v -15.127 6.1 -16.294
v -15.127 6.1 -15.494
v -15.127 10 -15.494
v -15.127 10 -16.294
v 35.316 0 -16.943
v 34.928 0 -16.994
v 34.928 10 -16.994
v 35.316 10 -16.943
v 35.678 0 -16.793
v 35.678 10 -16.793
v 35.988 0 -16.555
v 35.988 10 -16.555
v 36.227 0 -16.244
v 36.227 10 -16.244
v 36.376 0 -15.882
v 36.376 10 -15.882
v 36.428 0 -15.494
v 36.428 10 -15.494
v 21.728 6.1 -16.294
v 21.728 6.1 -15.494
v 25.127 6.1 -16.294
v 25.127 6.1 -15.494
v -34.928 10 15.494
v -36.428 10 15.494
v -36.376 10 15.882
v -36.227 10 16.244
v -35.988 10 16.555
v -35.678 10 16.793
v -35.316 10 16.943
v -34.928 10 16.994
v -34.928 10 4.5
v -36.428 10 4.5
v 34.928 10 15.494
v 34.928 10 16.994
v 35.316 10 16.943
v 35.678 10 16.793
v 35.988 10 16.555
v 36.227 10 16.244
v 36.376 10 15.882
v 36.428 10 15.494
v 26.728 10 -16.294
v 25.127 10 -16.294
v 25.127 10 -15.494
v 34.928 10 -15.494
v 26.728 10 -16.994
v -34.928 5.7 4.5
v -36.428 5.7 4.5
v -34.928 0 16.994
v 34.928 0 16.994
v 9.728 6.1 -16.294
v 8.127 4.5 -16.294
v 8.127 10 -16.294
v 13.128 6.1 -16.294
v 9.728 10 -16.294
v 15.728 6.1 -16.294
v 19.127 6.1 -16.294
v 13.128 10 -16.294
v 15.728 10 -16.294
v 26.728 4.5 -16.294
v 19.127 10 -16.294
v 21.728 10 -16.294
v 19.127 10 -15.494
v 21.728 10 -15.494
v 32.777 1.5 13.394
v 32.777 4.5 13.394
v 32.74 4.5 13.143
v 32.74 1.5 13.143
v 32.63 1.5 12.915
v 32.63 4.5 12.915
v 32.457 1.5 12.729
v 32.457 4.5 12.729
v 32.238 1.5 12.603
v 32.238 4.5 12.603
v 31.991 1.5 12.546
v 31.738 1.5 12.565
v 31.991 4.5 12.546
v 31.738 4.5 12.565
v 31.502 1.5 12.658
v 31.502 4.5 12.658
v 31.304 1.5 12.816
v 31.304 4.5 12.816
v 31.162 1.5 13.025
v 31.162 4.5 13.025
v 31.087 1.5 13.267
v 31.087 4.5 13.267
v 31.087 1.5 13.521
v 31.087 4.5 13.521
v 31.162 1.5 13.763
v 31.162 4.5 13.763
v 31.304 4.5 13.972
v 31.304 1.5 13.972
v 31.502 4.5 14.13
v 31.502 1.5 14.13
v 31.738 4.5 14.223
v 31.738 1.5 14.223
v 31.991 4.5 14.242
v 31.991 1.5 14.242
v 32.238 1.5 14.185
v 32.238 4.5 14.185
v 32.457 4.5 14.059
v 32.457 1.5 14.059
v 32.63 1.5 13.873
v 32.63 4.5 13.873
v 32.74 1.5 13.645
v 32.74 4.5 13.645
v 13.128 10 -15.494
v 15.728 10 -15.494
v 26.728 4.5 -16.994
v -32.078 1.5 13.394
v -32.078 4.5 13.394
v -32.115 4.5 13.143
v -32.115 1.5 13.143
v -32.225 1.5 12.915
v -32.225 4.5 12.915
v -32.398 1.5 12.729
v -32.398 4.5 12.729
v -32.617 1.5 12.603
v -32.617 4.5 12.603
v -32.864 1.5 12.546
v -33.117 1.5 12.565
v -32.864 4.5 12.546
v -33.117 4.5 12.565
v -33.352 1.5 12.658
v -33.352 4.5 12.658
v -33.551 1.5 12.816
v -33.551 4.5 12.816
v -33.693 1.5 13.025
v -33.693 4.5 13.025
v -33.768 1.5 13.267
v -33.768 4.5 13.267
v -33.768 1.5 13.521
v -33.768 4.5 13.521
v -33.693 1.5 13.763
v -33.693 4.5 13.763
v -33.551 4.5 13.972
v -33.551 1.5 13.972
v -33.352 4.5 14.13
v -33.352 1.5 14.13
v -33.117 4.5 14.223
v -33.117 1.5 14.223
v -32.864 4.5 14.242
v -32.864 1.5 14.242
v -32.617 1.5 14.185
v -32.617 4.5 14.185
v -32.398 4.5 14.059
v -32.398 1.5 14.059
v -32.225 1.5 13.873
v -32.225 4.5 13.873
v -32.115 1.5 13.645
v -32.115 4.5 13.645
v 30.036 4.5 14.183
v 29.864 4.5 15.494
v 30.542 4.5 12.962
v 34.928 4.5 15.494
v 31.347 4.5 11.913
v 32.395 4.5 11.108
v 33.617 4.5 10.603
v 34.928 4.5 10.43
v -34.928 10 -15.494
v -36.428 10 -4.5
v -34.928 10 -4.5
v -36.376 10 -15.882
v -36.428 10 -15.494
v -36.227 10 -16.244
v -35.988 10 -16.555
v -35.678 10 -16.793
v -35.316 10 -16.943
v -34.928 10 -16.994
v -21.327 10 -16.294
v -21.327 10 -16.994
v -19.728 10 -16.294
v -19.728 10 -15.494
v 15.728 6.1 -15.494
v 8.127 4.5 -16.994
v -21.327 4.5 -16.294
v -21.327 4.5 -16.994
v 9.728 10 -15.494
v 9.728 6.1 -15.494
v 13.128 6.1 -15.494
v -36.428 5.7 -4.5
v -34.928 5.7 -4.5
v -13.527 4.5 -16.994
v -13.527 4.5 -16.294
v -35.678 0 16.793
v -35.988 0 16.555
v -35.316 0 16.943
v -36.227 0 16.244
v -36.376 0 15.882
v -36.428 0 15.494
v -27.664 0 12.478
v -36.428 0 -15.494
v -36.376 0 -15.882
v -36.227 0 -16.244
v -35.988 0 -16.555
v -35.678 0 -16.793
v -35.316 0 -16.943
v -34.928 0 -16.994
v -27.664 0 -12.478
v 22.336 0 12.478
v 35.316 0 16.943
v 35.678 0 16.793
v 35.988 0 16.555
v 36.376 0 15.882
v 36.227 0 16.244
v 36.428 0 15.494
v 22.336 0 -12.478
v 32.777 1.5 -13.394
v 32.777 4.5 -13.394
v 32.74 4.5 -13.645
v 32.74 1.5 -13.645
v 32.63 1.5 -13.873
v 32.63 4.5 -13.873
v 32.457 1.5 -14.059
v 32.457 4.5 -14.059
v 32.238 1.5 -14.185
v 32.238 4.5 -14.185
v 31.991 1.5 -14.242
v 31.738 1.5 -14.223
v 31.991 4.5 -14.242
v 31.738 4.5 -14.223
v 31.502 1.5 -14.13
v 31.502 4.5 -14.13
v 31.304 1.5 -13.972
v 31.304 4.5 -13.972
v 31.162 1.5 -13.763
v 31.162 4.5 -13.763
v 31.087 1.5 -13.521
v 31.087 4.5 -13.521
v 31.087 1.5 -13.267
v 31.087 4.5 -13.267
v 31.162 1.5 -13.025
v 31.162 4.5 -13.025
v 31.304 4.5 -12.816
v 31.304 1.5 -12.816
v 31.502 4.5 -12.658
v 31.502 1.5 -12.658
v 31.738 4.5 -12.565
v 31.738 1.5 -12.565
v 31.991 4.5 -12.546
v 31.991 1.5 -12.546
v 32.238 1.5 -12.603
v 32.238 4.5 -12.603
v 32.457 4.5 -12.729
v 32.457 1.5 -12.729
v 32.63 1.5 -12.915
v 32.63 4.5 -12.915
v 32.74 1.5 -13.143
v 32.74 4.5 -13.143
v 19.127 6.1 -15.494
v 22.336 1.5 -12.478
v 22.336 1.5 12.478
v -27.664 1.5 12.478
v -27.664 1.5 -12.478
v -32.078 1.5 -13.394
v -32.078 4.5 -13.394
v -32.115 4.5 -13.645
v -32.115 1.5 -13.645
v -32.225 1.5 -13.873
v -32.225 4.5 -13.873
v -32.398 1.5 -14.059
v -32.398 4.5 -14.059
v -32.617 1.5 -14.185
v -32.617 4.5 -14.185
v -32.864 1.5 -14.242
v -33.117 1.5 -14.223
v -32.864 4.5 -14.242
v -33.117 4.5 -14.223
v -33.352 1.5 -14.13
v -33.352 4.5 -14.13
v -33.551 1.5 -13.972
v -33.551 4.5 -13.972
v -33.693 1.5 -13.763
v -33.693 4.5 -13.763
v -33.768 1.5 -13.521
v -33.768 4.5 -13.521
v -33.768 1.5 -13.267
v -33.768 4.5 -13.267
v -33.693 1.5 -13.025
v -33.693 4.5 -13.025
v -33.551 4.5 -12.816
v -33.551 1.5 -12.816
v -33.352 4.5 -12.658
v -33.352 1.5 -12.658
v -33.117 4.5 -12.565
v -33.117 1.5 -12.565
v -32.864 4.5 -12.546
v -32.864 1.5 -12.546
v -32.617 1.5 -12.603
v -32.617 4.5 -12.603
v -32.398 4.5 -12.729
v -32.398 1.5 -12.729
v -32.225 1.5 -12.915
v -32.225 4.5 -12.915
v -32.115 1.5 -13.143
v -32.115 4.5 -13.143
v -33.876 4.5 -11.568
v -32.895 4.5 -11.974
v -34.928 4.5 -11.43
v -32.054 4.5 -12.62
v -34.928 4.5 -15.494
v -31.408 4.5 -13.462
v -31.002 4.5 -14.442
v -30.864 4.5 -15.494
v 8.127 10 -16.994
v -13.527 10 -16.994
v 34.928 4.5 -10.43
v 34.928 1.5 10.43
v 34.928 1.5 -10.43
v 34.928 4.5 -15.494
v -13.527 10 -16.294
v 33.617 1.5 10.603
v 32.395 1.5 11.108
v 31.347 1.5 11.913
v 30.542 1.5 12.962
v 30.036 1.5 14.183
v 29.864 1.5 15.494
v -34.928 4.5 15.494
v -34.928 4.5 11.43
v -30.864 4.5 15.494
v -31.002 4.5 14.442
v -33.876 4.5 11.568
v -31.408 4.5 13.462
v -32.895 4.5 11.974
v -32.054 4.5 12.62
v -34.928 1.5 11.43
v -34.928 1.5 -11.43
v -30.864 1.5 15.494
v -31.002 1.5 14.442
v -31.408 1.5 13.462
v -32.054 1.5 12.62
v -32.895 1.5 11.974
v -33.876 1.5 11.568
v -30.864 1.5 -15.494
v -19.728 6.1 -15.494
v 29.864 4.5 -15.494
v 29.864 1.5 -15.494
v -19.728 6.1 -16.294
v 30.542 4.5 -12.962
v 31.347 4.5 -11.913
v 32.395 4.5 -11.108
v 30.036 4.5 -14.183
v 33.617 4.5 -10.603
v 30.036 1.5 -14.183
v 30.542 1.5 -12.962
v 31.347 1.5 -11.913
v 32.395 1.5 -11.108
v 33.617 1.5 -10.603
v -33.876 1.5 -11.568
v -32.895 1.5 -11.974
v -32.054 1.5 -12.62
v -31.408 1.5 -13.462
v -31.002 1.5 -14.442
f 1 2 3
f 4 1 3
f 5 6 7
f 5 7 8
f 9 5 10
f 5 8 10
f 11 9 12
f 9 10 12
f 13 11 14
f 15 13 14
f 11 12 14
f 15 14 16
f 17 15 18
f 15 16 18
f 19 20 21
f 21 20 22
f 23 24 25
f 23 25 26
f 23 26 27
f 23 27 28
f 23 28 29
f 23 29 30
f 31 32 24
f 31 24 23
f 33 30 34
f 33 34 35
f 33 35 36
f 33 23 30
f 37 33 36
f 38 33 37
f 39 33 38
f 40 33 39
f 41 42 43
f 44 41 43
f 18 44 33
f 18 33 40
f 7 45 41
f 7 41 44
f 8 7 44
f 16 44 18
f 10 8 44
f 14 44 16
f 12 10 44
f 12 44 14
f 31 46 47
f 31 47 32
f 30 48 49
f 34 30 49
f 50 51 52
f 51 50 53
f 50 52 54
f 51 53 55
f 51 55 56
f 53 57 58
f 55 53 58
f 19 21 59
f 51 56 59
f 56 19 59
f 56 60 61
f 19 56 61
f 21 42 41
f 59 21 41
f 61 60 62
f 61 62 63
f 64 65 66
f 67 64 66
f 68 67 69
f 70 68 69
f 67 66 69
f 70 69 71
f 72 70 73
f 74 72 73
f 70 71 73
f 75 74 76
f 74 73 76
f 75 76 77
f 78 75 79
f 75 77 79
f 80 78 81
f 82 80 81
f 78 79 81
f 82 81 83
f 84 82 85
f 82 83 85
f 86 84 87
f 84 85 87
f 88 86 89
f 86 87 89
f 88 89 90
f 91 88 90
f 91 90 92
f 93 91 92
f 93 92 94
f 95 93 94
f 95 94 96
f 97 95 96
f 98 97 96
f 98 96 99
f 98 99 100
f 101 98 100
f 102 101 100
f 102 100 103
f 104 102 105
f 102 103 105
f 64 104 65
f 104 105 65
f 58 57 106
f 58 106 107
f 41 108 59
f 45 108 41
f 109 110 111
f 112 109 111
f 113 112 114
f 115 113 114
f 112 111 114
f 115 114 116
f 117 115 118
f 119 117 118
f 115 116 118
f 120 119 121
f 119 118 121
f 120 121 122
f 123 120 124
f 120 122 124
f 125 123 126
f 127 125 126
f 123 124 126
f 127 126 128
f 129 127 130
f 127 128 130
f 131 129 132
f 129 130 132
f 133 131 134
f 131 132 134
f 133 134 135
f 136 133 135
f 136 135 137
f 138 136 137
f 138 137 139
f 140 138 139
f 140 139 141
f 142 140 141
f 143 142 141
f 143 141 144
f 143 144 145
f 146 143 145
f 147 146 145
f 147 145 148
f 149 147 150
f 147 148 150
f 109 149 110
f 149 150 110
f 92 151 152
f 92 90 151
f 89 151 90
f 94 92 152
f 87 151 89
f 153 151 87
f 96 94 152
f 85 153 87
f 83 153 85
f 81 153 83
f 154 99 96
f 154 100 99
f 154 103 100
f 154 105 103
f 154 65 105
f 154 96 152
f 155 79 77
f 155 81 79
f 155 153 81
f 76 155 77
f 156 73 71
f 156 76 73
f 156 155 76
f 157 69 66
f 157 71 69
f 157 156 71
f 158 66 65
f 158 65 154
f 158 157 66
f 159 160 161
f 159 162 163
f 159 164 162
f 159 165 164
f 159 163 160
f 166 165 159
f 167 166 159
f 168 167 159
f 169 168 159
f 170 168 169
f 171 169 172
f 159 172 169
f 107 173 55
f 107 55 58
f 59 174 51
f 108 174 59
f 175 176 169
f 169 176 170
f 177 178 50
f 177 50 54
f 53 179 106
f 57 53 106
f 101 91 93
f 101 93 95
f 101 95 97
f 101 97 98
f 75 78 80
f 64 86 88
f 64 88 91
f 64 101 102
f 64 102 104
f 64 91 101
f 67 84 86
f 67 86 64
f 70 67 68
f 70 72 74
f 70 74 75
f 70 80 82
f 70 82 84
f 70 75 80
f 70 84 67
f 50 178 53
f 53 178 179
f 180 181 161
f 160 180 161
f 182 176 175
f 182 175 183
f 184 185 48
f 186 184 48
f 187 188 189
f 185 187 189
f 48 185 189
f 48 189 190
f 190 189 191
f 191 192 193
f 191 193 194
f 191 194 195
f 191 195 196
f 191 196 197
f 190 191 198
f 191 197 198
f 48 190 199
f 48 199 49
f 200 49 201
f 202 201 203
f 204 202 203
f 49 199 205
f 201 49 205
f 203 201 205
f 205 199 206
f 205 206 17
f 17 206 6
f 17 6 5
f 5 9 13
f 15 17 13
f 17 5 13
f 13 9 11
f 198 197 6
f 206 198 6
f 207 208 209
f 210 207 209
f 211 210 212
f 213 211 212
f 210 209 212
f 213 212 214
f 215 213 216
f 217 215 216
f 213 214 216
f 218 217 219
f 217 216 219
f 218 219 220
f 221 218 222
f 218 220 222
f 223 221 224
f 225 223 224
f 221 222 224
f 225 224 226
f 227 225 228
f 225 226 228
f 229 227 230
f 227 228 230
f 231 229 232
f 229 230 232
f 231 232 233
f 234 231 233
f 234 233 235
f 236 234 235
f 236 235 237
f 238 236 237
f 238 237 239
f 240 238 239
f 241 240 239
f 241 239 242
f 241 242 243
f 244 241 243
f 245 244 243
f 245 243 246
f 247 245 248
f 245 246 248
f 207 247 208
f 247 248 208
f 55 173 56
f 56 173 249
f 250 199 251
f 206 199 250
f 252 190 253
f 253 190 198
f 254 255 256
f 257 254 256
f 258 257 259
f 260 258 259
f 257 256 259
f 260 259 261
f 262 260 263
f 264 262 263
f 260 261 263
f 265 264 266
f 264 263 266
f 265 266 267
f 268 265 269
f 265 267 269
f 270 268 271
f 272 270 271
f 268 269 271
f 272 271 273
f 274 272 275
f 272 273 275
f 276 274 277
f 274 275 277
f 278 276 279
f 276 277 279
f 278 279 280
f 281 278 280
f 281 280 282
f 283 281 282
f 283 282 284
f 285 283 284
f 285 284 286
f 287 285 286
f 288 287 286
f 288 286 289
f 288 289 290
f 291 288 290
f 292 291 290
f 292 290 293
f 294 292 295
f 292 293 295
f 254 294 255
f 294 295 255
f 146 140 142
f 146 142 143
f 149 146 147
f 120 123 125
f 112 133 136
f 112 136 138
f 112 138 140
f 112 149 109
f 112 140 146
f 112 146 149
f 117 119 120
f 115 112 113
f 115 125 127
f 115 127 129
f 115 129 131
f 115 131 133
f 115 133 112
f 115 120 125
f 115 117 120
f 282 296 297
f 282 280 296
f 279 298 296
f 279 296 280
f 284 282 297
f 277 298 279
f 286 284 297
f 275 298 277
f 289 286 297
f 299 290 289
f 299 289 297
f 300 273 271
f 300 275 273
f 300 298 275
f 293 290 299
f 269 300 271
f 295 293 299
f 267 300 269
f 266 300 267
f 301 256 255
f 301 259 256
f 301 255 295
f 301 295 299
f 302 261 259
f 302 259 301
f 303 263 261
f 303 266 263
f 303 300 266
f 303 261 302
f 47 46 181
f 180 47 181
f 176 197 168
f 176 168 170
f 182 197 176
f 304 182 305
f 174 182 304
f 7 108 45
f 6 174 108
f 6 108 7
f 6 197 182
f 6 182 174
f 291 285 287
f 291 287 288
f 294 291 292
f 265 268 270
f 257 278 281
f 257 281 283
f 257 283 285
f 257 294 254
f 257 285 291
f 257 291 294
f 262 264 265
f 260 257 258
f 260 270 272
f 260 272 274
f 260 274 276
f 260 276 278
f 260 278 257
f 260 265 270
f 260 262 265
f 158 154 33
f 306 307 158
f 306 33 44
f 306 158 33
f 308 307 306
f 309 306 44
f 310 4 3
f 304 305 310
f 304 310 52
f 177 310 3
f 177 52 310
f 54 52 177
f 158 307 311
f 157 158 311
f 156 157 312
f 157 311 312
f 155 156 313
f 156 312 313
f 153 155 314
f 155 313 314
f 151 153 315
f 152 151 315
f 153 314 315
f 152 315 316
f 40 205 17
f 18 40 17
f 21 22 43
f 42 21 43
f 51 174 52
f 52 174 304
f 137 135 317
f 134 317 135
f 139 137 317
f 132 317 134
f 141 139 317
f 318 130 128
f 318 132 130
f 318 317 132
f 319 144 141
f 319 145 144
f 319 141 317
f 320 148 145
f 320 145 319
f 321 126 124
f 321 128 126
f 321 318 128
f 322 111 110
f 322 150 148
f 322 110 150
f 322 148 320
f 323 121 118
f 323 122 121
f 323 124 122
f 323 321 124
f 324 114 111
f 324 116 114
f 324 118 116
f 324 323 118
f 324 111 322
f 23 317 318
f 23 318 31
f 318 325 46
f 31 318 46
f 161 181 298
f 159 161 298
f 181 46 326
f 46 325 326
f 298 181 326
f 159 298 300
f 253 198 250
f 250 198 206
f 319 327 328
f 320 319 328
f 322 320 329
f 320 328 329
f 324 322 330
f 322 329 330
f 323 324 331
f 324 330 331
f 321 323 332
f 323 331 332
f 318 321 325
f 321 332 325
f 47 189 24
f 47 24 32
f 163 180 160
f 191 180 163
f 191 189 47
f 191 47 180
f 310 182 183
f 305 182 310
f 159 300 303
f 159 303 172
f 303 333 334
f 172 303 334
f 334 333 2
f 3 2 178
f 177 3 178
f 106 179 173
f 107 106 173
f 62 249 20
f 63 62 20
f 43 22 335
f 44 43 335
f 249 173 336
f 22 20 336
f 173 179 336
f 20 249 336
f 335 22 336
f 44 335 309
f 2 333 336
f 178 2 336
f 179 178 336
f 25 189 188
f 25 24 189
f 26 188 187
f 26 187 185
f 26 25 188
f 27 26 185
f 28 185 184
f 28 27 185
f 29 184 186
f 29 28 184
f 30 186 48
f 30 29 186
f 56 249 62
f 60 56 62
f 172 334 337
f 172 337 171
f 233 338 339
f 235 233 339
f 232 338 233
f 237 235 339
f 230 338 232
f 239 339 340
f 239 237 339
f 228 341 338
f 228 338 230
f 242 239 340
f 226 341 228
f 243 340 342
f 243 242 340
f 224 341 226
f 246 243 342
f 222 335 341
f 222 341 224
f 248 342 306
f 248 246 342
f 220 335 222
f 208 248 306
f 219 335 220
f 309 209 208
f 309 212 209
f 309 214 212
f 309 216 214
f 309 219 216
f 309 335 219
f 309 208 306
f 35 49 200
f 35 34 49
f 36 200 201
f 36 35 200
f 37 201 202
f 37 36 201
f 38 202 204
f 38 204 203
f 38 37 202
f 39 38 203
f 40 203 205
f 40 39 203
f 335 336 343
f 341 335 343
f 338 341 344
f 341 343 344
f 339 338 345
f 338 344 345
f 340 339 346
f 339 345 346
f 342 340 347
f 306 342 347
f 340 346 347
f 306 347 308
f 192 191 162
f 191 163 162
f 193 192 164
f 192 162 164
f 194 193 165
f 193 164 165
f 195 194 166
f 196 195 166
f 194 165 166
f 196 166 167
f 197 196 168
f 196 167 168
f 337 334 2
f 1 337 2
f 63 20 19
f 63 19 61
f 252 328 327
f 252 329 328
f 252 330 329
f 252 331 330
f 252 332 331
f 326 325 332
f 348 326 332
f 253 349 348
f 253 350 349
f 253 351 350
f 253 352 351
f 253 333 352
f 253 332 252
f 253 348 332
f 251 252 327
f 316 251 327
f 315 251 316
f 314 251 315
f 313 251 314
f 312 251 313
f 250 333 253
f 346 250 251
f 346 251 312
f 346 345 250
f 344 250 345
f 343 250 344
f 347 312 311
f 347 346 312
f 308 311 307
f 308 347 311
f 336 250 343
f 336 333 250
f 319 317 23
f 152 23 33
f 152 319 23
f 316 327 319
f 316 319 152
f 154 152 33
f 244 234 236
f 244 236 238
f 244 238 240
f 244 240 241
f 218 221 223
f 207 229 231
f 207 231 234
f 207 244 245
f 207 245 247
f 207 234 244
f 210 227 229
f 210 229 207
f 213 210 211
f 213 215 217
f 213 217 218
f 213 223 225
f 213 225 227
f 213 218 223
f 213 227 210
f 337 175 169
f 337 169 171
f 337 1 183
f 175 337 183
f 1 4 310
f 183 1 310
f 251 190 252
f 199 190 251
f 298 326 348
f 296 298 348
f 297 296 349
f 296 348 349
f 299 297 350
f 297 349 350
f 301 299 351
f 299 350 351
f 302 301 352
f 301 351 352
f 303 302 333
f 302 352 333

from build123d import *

# Parameters (mm, degrees)
SKETCH_1_W          = 69.855
SKETCH_1_H          = 30.988
EXTRUDE_1_DEPTH     = 1.5
CUT_EXTRUDE_2_REACH = 3.5
SKETCH_1_6_W        = 50
SKETCH_1_6_H        = 24.956
SKETCH_1_7_W        = 72.855
SKETCH_1_7_H        = 33.988
SKETCH_1_7_W_2      = 69.855
SKETCH_1_7_H_2      = 30.988
EXTRUDE_1_2_DEPTH   = 10
FILLET_1_R          = 1.5
EXTRUDE_2_DEPTH     = 3
CUT_EXTRUDE_3_REACH = 3.5
SKETCH_4_W          = 9
SKETCH_4_H          = 4.3
CUT_EXTRUDE_4_REACH = 3.5
SKETCH_5_W          = 3.4
SKETCH_5_H          = 4
SKETCH_5_W_2        = 4.6
CUT_EXTRUDE_START   = -1.5
SKETCH_5_6_W        = 7.8
SKETCH_5_6_H        = 7.2
SKETCH_5_6_W_2      = 18.6
CUT_EXTRUDE_6_DEPTH = 0.7
SKETCH_3_R          = 0.85
CUT_EXTRUDE_7_DEPTH = 3


with BuildPart() as part:
    # 草图1 → Extrude 1 (new body)
    with BuildSketch(Plane(origin=(0, 0, 0), x_dir=(1, 0, 0), z_dir=(0, 1, 0))):
        Rectangle(SKETCH_1_W, SKETCH_1_H)
    extrude(amount=EXTRUDE_1_DEPTH)

    # 草图1<6> → 切除-拉伸2 (cut, up to next)
    with BuildSketch(Plane(origin=(0, 0, 0), x_dir=(1, 0, 0), z_dir=(0, 1, 0)), mode=Mode.PRIVATE) as cut_extrude_2_sk1:
        with Locations((-2.6635, 0)):
            Rectangle(SKETCH_1_6_W, SKETCH_1_6_H)
    cut_extrude_2_tool1 = extrude(cut_extrude_2_sk1.sketch, amount=CUT_EXTRUDE_2_REACH, mode=Mode.PRIVATE) & part.part
    add(cut_extrude_2_tool1.solids().sort_by_distance((-2.6635, 0, 0))[0], mode=Mode.SUBTRACT)



with BuildPart() as body_2:
    # 草图1<7> → Extrude 1 2 (new body)
    with BuildSketch(Plane(origin=(0, 0, 0), x_dir=(1, 0, 0), z_dir=(0, 1, 0))):
        Rectangle(SKETCH_1_7_W, SKETCH_1_7_H)
        Rectangle(SKETCH_1_7_W_2, SKETCH_1_7_H_2, mode=Mode.SUBTRACT)
    extrude(amount=EXTRUDE_1_2_DEPTH)

    # 圆角1
    fillet_1_edges = [body_2.edges().sort_by_distance(p)[0] for p in [
        (-36.4275, 5, -16.994),
        (-36.4275, 5, 16.994),
        (36.4275, 5, 16.994),
        (36.4275, 5, -16.994),
    ]]
    fillet(fillet_1_edges, radius=FILLET_1_R)


with BuildPart() as part_1:
    add(part.part)

    add(body_2.part)  # 凸台-拉伸2 merges body 2
    # 草图2 → 凸台-拉伸2 (add)
    with BuildSketch(Plane(origin=(0, 1.5, 0), x_dir=(1, 0, 0), z_dir=(0, 1, 0))):
        with BuildLine():
            ThreePointArc((-30.8635, -15.494), (-32.053818041, -12.620318041), (-34.9275, -11.43))
            Line((-34.9275, -11.43), (-34.9275, -15.494))
            Line((-34.9275, -15.494), (-30.8635, -15.494))
        make_face()
        with BuildLine():
            ThreePointArc((-34.9275, 11.43), (-32.053818041, 12.620318041), (-30.8635, 15.494))
            Line((-30.8635, 15.494), (-34.9275, 15.494))
            Line((-34.9275, 15.494), (-34.9275, 11.43))
        make_face()
        with BuildLine():
            Line((34.9275, 15.494), (29.8635, 15.494))
            ThreePointArc((29.8635, 15.494), (31.34671126, 11.91321126), (34.9275, 10.43))
            Line((34.9275, 10.43), (34.9275, 15.494))
        make_face()
        with BuildLine():
            Line((34.9275, -15.494), (34.9275, -10.43))
            ThreePointArc((34.9275, -10.43), (31.34671126, -11.91321126), (29.8635, -15.494))
            Line((29.8635, -15.494), (34.9275, -15.494))
        make_face()
    extrude(amount=EXTRUDE_2_DEPTH)

    # 草图4 → 切除-拉伸3 (cut, up to next)
    with BuildSketch(Plane(origin=(-34.9275, 0, 0), x_dir=(0, 0, -1), z_dir=(1, 0, 0)), mode=Mode.PRIVATE) as cut_extrude_3_sk1:
        with Locations((0, 7.85)):
            Rectangle(SKETCH_4_W, SKETCH_4_H)
    cut_extrude_3_tool1 = extrude(cut_extrude_3_sk1.sketch, amount=-CUT_EXTRUDE_3_REACH, mode=Mode.PRIVATE) & part_1.part
    add(cut_extrude_3_tool1.solids().sort_by_distance((-34.9275, 7.85, 0))[0], mode=Mode.SUBTRACT)

    # 草图5 → 切除-拉伸4 (cut, up to next)
    with BuildSketch(Plane.XY.offset(-15.494), mode=Mode.PRIVATE) as cut_extrude_4_sk1:
        with Locations((11.4275, 8.1)):
            Rectangle(SKETCH_5_W, SKETCH_5_H)
    cut_extrude_4_tool1 = extrude(cut_extrude_4_sk1.sketch, amount=-CUT_EXTRUDE_4_REACH, mode=Mode.PRIVATE) & part_1.part
    add(cut_extrude_4_tool1.solids().sort_by_distance((11.4275, 8.1, -15.494))[0], mode=Mode.SUBTRACT)
    # 草图5 → 切除-拉伸4 (cut, up to next)
    with BuildSketch(Plane.XY.offset(-15.494), mode=Mode.PRIVATE) as cut_extrude_4_sk2:
        with Locations((17.4275, 8.1)):
            Rectangle(SKETCH_5_W, SKETCH_5_H)
    cut_extrude_4_tool2 = extrude(cut_extrude_4_sk2.sketch, amount=-CUT_EXTRUDE_4_REACH, mode=Mode.PRIVATE) & part_1.part
    add(cut_extrude_4_tool2.solids().sort_by_distance((17.4275, 8.1, -15.494))[0], mode=Mode.SUBTRACT)
    # 草图5 → 切除-拉伸4 (cut, up to next)
    with BuildSketch(Plane.XY.offset(-15.494), mode=Mode.PRIVATE) as cut_extrude_4_sk3:
        with Locations((23.4275, 8.1)):
            Rectangle(SKETCH_5_W, SKETCH_5_H)
    cut_extrude_4_tool3 = extrude(cut_extrude_4_sk3.sketch, amount=-CUT_EXTRUDE_4_REACH, mode=Mode.PRIVATE) & part_1.part
    add(cut_extrude_4_tool3.solids().sort_by_distance((23.4275, 8.1, -15.494))[0], mode=Mode.SUBTRACT)
    # 草图5 → 切除-拉伸4 (cut, up to next)
    with BuildSketch(Plane.XY.offset(-15.494), mode=Mode.PRIVATE) as cut_extrude_4_sk4:
        with Locations((-17.4275, 8.1)):
            Rectangle(SKETCH_5_W_2, SKETCH_5_H)
    cut_extrude_4_tool4 = extrude(cut_extrude_4_sk4.sketch, amount=-CUT_EXTRUDE_4_REACH, mode=Mode.PRIVATE) & part_1.part
    add(cut_extrude_4_tool4.solids().sort_by_distance((-17.4275, 8.1, -15.494))[0], mode=Mode.SUBTRACT)

    # 草图5<6> → 切除-拉伸6 (cut)
    with BuildSketch(Plane.XY.offset(-15.494).offset(CUT_EXTRUDE_START)):
        with Locations((-17.4275, 8.1)):
            Rectangle(SKETCH_5_6_W, SKETCH_5_6_H)
        with Locations((17.4275, 8.1)):
            Rectangle(SKETCH_5_6_W_2, SKETCH_5_6_H)
    extrude(amount=CUT_EXTRUDE_6_DEPTH, mode=Mode.SUBTRACT)

    # 草图3 → 切除-拉伸7 (cut)
    with BuildSketch(Plane(origin=(0, 4.5, 0), x_dir=(1, 0, 0), z_dir=(0, 1, 0))):
        with Locations((-32.9275, -13.394)):
            Circle(SKETCH_3_R)
        with Locations((-32.9275, 13.394)):
            Circle(SKETCH_3_R)
        with Locations((31.9275, -13.394)):
            Circle(SKETCH_3_R)
        with Locations((31.9275, 13.394)):
            Circle(SKETCH_3_R)
    extrude(amount=-CUT_EXTRUDE_7_DEPTH, mode=Mode.SUBTRACT)


solid = part_1.part
